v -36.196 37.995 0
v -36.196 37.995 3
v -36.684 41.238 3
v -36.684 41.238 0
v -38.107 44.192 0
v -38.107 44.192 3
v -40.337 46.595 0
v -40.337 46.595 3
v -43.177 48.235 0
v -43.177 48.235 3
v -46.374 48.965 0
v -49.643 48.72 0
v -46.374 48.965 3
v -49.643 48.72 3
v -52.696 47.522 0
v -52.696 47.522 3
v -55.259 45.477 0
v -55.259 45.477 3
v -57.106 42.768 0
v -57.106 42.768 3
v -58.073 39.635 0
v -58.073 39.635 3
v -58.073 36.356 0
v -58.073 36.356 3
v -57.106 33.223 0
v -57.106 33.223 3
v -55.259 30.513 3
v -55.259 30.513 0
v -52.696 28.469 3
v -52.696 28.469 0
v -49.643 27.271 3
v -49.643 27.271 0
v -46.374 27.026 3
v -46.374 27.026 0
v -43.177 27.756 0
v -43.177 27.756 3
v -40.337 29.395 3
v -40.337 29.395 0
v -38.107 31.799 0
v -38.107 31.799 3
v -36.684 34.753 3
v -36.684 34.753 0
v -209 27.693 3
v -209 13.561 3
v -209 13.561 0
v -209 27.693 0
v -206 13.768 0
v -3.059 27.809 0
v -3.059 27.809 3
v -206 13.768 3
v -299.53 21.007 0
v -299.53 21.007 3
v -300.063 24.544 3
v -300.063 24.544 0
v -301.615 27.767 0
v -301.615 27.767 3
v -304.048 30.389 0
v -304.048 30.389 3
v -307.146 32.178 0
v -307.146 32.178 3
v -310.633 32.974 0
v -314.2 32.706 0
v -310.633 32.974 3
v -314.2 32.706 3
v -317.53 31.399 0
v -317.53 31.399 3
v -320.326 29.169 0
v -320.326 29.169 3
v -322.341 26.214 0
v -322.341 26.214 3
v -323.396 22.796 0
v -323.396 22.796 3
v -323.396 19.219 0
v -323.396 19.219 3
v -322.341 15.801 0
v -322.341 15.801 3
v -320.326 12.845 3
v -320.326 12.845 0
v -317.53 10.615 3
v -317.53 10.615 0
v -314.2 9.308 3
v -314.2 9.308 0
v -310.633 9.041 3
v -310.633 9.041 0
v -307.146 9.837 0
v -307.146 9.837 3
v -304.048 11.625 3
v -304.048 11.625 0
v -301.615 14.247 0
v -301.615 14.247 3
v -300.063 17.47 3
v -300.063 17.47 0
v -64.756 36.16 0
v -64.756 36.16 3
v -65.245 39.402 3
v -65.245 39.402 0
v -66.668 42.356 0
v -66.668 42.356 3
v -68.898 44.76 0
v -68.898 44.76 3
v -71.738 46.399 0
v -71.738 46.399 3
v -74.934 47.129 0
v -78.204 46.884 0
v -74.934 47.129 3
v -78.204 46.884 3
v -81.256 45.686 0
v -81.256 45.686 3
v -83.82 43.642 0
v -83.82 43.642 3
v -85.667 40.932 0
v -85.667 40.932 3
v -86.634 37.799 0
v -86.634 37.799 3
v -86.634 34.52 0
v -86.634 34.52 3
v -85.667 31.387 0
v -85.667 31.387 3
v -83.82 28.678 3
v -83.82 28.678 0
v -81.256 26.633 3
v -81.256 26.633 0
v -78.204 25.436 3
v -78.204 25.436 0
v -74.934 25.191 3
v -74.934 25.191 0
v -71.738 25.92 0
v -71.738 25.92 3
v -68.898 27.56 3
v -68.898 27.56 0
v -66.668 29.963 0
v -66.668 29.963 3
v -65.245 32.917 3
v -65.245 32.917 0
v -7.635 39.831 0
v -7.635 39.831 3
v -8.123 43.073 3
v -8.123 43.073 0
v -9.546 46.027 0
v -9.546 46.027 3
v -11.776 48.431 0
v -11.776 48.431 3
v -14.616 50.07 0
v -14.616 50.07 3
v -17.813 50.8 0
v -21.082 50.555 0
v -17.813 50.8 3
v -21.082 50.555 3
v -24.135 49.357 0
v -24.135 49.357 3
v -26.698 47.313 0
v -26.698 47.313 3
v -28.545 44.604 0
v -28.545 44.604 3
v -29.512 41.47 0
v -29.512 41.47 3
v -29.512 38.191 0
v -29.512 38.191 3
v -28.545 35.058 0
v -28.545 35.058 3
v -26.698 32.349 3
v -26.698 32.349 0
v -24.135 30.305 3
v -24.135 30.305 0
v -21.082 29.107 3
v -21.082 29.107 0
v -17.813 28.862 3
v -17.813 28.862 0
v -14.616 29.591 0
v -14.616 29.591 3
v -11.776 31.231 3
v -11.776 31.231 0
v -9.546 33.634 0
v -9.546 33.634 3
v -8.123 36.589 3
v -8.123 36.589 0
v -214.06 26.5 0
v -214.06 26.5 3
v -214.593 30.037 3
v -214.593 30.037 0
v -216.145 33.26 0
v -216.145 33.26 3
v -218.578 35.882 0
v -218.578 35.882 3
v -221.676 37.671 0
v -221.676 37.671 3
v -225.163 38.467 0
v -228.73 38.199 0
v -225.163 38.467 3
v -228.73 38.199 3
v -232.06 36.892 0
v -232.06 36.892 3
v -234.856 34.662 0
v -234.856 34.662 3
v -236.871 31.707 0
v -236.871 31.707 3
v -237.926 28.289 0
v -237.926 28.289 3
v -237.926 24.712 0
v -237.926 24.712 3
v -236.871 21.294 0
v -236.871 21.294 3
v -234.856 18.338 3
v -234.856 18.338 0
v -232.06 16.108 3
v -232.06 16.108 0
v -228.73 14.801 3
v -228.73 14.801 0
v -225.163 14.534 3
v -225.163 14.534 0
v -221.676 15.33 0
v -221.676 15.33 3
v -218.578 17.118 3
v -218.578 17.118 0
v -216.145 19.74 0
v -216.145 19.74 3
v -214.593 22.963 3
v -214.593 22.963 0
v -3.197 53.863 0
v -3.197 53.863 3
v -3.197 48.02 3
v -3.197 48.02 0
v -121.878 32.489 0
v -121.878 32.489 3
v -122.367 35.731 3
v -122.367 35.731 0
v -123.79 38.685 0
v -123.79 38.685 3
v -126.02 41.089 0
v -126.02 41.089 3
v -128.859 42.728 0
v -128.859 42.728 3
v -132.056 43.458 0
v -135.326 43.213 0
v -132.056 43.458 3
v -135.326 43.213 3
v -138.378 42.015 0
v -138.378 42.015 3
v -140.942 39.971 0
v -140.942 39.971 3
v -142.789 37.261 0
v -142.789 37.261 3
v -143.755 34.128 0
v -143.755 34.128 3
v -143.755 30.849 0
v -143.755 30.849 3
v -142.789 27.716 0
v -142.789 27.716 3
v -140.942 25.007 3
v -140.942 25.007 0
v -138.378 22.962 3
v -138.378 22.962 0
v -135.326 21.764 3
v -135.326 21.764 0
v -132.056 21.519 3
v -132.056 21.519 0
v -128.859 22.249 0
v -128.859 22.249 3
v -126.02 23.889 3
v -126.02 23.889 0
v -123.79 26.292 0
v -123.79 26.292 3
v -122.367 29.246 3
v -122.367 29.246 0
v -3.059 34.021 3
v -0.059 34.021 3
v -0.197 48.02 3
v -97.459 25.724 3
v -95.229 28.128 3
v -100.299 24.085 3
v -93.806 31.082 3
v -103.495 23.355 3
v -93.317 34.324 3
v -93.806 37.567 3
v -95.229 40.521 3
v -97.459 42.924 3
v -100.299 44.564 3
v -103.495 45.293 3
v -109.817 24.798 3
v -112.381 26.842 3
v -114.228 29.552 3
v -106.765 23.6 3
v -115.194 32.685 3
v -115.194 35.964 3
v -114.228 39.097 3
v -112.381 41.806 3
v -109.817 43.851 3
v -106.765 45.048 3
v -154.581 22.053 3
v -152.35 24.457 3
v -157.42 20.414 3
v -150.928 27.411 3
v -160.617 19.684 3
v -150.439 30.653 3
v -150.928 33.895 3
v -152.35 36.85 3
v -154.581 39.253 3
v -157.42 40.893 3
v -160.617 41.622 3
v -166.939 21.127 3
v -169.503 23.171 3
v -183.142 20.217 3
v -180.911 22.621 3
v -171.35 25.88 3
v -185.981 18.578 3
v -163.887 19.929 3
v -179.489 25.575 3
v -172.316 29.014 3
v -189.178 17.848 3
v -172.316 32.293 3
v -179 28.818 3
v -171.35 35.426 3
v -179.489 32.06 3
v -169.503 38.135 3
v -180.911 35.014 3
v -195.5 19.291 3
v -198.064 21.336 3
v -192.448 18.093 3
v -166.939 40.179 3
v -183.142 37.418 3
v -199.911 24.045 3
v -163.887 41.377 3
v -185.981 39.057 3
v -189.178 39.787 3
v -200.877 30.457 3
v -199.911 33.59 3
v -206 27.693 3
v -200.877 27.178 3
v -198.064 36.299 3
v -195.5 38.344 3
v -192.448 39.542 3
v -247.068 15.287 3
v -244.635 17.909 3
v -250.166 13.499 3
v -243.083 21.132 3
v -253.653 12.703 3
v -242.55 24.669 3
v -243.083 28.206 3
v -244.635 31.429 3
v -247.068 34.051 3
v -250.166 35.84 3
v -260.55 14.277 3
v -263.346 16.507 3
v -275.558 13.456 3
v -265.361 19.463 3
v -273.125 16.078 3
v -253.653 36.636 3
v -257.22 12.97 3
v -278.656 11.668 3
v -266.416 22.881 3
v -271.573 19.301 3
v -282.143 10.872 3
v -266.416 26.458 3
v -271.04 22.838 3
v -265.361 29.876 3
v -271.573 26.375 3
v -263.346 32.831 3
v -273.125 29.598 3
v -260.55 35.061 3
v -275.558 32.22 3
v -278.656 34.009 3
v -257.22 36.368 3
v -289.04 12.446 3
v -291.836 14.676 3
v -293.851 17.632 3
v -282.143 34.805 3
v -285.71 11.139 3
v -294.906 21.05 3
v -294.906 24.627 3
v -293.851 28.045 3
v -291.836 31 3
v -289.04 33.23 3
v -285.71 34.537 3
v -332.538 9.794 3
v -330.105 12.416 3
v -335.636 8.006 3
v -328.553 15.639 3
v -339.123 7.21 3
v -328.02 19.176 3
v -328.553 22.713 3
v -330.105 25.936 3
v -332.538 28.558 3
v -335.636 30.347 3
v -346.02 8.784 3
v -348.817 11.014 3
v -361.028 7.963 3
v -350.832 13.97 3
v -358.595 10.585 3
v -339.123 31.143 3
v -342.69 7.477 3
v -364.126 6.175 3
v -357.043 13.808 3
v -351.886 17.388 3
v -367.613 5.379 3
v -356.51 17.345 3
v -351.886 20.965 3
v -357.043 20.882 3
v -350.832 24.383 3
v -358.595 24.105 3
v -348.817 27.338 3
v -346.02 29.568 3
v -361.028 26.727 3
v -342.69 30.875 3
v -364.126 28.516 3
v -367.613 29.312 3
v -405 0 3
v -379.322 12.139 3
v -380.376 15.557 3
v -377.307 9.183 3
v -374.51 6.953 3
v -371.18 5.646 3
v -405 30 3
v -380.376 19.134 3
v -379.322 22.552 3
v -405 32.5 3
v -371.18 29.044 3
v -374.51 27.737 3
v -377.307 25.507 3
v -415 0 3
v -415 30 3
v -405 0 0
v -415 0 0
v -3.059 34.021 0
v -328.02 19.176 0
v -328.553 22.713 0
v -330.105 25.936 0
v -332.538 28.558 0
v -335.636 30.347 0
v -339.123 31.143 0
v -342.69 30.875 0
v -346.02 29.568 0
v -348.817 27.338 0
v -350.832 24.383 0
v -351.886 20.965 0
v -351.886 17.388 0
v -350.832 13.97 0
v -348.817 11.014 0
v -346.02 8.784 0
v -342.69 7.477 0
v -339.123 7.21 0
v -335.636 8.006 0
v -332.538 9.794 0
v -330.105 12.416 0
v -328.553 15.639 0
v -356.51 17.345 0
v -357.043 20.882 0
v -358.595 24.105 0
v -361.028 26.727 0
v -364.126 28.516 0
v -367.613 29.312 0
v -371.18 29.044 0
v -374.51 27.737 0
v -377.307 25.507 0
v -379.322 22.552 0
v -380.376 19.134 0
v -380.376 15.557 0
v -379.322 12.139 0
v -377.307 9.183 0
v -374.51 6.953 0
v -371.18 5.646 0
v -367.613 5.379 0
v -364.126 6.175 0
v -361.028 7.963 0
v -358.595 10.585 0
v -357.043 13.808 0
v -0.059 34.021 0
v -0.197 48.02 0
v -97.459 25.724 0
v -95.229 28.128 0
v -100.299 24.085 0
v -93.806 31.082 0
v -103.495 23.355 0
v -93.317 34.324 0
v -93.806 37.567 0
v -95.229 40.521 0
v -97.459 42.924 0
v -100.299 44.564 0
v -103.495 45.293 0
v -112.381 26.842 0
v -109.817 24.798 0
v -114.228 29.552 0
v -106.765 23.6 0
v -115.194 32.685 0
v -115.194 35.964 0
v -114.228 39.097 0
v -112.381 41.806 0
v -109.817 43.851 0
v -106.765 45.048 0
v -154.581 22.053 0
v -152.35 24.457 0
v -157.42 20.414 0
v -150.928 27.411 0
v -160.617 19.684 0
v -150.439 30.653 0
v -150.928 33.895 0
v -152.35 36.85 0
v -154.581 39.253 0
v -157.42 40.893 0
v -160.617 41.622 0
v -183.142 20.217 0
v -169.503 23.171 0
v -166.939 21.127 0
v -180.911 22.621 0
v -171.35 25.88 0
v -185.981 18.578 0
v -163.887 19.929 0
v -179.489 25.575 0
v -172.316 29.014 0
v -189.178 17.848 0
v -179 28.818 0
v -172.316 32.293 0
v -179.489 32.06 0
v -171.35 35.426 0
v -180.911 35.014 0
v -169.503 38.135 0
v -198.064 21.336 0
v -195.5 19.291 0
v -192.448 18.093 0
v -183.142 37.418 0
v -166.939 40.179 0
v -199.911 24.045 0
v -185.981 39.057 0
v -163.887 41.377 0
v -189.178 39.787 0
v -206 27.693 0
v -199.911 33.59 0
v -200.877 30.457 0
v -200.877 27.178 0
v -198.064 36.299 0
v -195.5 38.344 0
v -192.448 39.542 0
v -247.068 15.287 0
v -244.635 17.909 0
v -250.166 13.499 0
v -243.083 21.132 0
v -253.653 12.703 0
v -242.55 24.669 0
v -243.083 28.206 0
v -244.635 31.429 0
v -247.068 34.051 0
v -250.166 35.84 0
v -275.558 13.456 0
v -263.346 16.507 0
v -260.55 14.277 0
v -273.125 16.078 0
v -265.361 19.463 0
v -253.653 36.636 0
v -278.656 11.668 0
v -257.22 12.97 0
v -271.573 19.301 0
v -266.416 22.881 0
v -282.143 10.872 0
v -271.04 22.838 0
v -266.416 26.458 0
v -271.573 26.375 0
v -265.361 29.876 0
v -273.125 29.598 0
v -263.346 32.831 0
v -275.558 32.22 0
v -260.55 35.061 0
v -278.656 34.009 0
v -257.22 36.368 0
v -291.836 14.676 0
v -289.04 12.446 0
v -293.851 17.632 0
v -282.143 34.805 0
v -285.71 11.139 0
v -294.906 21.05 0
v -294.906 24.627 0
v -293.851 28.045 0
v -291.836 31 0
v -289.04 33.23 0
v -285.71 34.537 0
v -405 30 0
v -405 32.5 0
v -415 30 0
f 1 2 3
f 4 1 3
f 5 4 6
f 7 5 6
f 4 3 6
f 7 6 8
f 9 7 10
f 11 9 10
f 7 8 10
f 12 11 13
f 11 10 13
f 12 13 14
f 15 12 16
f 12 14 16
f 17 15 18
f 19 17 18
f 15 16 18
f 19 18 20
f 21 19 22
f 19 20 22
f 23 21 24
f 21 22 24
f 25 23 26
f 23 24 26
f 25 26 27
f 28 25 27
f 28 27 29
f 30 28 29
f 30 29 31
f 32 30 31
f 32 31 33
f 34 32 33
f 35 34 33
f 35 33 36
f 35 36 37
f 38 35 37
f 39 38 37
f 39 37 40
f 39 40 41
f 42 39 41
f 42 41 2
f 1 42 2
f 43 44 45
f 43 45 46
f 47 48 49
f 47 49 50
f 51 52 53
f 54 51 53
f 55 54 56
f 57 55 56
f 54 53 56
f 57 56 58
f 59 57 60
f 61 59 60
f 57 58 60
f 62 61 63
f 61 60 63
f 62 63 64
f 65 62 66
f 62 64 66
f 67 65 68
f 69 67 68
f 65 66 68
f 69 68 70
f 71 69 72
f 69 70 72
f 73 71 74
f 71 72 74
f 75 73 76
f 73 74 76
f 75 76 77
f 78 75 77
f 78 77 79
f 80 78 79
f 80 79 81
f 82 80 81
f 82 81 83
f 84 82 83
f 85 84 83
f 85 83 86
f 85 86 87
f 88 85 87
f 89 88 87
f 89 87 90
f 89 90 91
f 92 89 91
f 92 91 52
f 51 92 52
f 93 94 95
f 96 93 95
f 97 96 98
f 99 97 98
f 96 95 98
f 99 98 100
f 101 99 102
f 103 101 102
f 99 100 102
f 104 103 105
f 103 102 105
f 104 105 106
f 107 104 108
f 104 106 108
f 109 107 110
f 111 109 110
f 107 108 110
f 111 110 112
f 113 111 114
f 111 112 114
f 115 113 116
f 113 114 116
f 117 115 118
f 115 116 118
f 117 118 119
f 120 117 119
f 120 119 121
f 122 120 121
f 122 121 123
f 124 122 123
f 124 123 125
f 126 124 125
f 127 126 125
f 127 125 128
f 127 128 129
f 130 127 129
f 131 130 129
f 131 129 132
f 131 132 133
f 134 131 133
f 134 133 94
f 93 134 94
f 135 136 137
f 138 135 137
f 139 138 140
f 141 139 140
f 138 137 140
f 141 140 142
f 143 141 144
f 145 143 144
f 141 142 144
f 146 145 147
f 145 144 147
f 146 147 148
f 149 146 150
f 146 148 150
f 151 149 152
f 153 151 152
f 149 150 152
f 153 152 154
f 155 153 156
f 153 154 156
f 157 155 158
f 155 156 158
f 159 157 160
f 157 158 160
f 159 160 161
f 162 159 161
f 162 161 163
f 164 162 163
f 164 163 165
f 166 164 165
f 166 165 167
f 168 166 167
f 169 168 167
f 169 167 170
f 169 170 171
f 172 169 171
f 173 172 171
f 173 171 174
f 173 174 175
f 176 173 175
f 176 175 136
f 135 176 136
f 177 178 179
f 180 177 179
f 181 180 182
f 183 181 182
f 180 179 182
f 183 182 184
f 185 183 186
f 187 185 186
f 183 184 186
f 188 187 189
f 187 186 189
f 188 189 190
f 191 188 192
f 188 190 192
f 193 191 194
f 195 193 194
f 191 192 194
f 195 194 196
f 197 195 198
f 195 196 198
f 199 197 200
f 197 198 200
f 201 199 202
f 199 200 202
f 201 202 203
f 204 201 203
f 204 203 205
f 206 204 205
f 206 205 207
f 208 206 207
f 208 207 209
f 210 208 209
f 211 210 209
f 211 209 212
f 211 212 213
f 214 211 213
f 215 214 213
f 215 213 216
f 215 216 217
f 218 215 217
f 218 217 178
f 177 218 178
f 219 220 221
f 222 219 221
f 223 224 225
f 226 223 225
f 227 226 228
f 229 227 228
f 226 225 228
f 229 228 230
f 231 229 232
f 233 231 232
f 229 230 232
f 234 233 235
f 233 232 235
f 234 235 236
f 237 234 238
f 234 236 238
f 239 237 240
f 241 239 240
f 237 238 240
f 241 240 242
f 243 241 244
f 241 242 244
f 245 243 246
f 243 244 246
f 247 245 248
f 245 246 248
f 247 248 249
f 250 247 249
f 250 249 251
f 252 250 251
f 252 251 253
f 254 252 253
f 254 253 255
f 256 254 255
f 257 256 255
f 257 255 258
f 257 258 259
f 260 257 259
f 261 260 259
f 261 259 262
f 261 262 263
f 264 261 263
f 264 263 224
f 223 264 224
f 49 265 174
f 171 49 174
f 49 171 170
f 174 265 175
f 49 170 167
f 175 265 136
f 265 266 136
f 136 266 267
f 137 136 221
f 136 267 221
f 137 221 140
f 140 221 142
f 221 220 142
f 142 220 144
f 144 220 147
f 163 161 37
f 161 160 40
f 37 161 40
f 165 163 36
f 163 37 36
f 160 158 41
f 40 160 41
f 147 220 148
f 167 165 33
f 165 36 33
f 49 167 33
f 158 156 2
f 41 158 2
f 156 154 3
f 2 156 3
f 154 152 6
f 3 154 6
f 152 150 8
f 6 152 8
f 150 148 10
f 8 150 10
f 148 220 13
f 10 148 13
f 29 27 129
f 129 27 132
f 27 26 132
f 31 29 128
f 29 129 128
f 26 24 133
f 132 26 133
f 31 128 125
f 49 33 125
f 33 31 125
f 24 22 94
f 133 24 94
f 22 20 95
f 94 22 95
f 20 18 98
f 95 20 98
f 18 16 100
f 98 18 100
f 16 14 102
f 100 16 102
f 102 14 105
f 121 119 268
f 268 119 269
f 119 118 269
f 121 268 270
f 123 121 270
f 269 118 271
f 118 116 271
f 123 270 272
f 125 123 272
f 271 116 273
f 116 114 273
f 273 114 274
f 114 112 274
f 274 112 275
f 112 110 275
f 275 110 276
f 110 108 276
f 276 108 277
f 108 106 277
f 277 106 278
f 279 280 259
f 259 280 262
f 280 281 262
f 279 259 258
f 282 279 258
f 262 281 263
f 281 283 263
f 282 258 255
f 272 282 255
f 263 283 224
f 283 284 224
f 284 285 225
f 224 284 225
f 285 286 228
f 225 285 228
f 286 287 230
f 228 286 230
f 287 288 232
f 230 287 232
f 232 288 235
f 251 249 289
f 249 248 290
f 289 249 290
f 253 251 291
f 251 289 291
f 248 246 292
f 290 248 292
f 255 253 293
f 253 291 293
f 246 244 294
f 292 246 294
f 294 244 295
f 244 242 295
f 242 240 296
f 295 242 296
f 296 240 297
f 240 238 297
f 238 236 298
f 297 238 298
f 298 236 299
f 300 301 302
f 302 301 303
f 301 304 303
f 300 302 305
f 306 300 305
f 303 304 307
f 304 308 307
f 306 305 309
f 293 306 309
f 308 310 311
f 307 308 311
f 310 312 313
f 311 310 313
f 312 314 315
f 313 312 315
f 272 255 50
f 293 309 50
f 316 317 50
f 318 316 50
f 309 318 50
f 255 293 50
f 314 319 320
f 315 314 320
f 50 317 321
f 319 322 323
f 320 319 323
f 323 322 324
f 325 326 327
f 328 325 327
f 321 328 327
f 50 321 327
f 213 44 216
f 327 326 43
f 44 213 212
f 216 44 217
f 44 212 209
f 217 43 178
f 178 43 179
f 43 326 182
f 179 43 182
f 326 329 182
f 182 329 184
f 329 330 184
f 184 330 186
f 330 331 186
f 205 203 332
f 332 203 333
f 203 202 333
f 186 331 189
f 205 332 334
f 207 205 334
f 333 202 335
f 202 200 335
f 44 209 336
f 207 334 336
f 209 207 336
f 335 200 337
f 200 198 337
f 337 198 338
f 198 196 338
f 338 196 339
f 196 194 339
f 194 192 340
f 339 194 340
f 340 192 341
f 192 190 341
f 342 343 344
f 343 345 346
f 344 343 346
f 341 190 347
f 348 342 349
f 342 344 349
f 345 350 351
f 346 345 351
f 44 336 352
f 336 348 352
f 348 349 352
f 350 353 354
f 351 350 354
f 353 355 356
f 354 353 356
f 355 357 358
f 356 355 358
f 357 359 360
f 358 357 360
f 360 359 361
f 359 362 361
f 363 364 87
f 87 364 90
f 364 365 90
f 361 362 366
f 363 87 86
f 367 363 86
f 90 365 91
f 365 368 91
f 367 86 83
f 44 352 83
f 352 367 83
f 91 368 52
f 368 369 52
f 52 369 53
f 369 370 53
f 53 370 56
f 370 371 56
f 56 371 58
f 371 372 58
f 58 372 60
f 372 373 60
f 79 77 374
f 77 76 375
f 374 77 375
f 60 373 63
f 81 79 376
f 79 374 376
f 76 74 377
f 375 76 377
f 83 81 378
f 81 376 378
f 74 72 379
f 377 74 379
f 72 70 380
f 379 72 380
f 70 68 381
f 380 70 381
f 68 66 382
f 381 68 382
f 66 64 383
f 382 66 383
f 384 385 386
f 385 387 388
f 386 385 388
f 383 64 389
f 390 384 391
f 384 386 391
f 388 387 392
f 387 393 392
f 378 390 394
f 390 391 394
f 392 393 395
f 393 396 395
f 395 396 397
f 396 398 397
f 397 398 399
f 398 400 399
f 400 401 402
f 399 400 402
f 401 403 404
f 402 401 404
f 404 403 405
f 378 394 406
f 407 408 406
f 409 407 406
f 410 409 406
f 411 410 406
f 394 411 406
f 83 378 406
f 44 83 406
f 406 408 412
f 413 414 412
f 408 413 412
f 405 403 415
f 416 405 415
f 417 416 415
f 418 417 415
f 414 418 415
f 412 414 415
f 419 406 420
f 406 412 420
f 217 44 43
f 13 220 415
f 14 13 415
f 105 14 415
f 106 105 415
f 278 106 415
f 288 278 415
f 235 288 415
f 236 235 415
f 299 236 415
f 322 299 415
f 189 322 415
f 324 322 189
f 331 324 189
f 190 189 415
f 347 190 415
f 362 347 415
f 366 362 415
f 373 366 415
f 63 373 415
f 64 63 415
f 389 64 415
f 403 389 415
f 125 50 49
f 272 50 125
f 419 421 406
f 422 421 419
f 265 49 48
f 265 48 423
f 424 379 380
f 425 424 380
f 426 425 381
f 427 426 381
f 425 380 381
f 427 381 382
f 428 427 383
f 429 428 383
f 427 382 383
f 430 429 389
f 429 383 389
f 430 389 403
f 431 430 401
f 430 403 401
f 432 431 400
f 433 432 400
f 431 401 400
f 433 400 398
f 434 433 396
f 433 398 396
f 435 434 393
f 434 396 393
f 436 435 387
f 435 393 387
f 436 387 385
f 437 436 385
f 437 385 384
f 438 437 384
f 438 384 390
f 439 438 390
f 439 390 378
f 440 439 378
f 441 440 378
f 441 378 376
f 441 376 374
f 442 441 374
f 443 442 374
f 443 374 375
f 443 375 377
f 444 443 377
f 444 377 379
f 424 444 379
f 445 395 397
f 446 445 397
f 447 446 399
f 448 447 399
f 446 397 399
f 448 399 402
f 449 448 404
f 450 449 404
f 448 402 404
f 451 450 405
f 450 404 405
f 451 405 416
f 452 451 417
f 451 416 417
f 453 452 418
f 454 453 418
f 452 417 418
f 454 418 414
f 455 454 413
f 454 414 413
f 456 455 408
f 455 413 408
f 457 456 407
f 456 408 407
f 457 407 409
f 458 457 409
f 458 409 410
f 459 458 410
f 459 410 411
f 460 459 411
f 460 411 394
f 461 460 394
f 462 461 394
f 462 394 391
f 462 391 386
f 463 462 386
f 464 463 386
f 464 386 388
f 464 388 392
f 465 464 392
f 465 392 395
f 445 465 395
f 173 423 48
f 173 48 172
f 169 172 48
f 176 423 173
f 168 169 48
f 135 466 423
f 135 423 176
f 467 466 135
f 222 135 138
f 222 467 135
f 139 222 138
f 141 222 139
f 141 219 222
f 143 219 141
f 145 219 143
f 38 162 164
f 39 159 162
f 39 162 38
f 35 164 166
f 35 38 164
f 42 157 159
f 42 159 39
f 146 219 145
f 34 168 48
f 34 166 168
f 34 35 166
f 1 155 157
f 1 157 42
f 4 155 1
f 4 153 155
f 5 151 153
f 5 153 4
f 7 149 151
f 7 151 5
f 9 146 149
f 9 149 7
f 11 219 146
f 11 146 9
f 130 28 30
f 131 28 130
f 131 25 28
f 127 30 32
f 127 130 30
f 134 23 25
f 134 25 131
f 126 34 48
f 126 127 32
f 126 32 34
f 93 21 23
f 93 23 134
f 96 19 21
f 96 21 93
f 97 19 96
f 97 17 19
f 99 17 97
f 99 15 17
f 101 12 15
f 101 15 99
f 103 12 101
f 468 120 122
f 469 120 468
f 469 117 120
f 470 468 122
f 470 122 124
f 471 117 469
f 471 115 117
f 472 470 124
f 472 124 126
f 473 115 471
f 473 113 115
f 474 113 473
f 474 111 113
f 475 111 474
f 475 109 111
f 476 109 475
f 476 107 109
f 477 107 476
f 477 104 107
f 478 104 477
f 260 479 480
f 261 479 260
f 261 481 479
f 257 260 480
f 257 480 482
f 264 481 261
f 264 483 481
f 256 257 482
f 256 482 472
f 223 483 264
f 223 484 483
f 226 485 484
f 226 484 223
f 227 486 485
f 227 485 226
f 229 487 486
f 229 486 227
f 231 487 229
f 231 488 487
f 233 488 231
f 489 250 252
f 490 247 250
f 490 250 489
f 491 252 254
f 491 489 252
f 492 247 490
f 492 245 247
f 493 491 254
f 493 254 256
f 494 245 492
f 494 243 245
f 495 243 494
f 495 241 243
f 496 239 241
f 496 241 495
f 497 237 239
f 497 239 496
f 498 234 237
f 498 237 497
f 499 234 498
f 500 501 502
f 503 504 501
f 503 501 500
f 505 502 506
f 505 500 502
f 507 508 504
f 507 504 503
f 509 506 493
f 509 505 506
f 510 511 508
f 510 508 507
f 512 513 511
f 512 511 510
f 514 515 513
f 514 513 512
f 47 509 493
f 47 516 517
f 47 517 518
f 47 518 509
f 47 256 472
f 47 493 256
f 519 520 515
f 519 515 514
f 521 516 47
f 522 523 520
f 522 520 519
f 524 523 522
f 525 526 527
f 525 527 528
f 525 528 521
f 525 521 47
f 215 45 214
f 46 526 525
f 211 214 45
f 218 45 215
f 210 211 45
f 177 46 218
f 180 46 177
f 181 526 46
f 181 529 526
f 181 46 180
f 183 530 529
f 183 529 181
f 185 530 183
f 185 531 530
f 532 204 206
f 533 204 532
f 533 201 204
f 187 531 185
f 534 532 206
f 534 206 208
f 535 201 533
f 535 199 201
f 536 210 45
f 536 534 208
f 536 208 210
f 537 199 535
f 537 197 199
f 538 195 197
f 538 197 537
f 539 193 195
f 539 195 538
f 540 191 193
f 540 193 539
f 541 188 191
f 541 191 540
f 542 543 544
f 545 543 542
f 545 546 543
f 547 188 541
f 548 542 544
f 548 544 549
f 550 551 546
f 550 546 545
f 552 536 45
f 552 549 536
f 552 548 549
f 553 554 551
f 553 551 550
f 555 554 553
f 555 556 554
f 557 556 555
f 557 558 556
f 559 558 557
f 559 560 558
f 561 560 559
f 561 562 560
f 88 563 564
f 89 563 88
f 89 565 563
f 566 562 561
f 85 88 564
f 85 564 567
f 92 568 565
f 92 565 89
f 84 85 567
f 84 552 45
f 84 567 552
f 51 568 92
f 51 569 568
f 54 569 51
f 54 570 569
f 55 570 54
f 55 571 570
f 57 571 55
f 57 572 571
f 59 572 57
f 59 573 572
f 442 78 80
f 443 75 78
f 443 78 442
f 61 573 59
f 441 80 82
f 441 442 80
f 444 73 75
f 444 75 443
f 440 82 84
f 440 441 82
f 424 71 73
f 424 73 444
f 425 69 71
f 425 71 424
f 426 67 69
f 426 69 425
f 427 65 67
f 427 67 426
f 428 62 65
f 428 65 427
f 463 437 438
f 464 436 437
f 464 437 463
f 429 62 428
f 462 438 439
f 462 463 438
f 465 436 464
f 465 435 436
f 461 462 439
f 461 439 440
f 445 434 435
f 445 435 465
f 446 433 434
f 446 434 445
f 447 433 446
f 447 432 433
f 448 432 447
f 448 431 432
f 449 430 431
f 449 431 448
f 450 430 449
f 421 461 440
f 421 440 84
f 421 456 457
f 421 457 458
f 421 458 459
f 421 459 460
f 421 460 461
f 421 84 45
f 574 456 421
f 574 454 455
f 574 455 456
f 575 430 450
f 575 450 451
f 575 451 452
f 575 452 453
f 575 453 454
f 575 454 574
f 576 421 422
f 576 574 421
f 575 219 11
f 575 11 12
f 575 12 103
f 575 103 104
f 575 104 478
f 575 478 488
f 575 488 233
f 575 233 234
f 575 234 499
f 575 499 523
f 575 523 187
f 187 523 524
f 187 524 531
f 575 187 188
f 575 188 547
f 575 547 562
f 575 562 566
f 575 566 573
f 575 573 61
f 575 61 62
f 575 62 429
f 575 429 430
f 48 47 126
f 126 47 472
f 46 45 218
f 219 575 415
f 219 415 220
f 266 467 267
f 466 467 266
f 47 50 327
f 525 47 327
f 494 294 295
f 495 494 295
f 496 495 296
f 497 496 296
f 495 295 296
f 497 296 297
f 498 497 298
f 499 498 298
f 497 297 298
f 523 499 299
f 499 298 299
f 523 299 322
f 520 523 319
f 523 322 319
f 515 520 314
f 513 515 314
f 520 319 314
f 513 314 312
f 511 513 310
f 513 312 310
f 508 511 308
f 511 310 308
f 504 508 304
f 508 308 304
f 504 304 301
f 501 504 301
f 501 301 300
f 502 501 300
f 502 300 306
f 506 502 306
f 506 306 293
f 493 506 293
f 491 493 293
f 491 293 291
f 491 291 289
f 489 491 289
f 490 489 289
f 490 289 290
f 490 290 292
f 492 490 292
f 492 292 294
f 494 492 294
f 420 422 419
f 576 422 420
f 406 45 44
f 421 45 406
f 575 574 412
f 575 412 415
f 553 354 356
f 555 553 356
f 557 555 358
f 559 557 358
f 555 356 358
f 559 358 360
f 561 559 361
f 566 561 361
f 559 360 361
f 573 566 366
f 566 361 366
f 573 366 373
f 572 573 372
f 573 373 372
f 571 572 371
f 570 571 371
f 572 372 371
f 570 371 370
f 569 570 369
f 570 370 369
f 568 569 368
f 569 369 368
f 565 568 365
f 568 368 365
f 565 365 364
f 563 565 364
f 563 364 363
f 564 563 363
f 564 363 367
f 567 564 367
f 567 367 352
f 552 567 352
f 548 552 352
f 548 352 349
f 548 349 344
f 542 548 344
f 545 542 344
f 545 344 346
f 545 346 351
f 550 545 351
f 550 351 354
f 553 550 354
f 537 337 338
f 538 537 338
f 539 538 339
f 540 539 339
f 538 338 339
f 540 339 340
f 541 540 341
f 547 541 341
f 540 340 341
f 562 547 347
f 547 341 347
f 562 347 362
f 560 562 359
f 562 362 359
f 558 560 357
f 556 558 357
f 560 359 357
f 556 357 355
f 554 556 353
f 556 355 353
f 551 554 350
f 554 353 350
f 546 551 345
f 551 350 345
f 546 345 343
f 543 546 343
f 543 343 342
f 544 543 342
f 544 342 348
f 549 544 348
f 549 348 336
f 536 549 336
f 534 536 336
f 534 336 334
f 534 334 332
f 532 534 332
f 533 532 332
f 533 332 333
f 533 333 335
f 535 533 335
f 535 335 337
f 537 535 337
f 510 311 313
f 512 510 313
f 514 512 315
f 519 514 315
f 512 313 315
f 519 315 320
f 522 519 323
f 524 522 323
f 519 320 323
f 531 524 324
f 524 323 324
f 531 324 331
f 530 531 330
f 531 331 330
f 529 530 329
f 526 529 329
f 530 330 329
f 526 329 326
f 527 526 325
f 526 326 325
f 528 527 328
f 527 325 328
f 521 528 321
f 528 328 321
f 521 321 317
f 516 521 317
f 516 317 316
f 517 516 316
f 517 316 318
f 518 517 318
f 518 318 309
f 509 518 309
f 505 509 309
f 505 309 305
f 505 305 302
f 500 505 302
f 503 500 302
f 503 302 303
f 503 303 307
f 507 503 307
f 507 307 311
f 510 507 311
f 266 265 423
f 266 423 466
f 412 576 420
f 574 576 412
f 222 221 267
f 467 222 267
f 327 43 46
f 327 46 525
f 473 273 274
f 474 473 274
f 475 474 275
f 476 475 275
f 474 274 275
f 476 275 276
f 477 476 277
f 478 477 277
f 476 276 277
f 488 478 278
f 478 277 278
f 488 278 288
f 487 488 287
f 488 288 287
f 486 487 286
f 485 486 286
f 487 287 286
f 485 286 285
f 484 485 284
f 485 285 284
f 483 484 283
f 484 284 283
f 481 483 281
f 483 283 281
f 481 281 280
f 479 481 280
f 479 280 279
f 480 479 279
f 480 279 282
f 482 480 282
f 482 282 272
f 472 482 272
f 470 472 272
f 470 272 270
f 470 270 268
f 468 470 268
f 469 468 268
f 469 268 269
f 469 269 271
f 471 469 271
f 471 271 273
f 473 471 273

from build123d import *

# Parameters (mm, degrees)
BOSS_EXTRUDE1_DEPTH     = 3
SKETCH2_R               = 12
SKETCH2_R_2             = 11
SKETCH2_W               = 3
SKETCH2_H               = 14.132174157
CUT_EXTRUDE1_DEPTH      = 1
CUT_EXTRUDE1_DEPTH_BACK = 4
CUT_EXTRUDE2_DEPTH      = 10


with BuildPart() as part:
    # Sketch1 → Boss-Extrude1 (new body)
    with BuildSketch(Plane.XY):
        Polygon((-415, 0), (-415, 30), (-405, 30), (-405, 32.5), (-0.255808808, 54.019626957), (0, 28.020885413), (-405, 0), align=None)
    extrude(amount=BOSS_EXTRUDE1_DEPTH)

    # Sketch2 → Cut-Extrude1 (cut, two sides)
    with BuildSketch(Plane.XY.offset(3)) as cut_extrude1_sk:
        with Locations((-368.509952953, 17.345136607)):
            Circle(SKETCH2_R)
        with Locations((-340.019905905, 19.176130471)):
            Circle(SKETCH2_R)
        with Locations((-311.529858858, 21.007124335)):
            Circle(SKETCH2_R)
        with Locations((-283.039811811, 22.8381182)):
            Circle(SKETCH2_R)
        with Locations((-254.549764764, 24.669112064)):
            Circle(SKETCH2_R)
        with Locations((-190, 28.817586197)):
            Circle(SKETCH2_R_2)
        with Locations((-161.439118955, 30.65313241)):
            Circle(SKETCH2_R_2)
        with Locations((-132.878237911, 32.488678622)):
            Circle(SKETCH2_R_2)
        with Locations((-104.317356866, 34.324224835)):
            Circle(SKETCH2_R_2)
        with Locations((-75.756475821, 36.159771047)):
            Circle(SKETCH2_R_2)
        with Locations((-47.195594776, 37.99531726)):
            Circle(SKETCH2_R_2)
        with Locations((-18.634713732, 39.830863473)):
            Circle(SKETCH2_R_2)
        with Locations((-226.059717716, 26.500105928)):
            Circle(SKETCH2_R)
        with Locations((-207.5, 20.626811871)):
            Rectangle(SKETCH2_W, SKETCH2_H)
    extrude(amount=CUT_EXTRUDE1_DEPTH, mode=Mode.SUBTRACT)
    extrude(cut_extrude1_sk.sketch, amount=-CUT_EXTRUDE1_DEPTH_BACK, mode=Mode.SUBTRACT)

    # Sketch3 → Cut-Extrude2 (cut)
    with BuildSketch(Plane.XY.offset(3)):
        Polygon((-0.255808808, 54.019626957), (-3.196773149, 53.8632604), (-3.196773149, 48.019626957), (-0.196773149, 48.019626957), align=None)
        Polygon((0, 28.020885413), (-3.059035659, 27.809238777), (-3.059035659, 34.020885413), (-0.059035659, 34.020885413), align=None)
    extrude(amount=-CUT_EXTRUDE2_DEPTH, mode=Mode.SUBTRACT)


solid = part.part
